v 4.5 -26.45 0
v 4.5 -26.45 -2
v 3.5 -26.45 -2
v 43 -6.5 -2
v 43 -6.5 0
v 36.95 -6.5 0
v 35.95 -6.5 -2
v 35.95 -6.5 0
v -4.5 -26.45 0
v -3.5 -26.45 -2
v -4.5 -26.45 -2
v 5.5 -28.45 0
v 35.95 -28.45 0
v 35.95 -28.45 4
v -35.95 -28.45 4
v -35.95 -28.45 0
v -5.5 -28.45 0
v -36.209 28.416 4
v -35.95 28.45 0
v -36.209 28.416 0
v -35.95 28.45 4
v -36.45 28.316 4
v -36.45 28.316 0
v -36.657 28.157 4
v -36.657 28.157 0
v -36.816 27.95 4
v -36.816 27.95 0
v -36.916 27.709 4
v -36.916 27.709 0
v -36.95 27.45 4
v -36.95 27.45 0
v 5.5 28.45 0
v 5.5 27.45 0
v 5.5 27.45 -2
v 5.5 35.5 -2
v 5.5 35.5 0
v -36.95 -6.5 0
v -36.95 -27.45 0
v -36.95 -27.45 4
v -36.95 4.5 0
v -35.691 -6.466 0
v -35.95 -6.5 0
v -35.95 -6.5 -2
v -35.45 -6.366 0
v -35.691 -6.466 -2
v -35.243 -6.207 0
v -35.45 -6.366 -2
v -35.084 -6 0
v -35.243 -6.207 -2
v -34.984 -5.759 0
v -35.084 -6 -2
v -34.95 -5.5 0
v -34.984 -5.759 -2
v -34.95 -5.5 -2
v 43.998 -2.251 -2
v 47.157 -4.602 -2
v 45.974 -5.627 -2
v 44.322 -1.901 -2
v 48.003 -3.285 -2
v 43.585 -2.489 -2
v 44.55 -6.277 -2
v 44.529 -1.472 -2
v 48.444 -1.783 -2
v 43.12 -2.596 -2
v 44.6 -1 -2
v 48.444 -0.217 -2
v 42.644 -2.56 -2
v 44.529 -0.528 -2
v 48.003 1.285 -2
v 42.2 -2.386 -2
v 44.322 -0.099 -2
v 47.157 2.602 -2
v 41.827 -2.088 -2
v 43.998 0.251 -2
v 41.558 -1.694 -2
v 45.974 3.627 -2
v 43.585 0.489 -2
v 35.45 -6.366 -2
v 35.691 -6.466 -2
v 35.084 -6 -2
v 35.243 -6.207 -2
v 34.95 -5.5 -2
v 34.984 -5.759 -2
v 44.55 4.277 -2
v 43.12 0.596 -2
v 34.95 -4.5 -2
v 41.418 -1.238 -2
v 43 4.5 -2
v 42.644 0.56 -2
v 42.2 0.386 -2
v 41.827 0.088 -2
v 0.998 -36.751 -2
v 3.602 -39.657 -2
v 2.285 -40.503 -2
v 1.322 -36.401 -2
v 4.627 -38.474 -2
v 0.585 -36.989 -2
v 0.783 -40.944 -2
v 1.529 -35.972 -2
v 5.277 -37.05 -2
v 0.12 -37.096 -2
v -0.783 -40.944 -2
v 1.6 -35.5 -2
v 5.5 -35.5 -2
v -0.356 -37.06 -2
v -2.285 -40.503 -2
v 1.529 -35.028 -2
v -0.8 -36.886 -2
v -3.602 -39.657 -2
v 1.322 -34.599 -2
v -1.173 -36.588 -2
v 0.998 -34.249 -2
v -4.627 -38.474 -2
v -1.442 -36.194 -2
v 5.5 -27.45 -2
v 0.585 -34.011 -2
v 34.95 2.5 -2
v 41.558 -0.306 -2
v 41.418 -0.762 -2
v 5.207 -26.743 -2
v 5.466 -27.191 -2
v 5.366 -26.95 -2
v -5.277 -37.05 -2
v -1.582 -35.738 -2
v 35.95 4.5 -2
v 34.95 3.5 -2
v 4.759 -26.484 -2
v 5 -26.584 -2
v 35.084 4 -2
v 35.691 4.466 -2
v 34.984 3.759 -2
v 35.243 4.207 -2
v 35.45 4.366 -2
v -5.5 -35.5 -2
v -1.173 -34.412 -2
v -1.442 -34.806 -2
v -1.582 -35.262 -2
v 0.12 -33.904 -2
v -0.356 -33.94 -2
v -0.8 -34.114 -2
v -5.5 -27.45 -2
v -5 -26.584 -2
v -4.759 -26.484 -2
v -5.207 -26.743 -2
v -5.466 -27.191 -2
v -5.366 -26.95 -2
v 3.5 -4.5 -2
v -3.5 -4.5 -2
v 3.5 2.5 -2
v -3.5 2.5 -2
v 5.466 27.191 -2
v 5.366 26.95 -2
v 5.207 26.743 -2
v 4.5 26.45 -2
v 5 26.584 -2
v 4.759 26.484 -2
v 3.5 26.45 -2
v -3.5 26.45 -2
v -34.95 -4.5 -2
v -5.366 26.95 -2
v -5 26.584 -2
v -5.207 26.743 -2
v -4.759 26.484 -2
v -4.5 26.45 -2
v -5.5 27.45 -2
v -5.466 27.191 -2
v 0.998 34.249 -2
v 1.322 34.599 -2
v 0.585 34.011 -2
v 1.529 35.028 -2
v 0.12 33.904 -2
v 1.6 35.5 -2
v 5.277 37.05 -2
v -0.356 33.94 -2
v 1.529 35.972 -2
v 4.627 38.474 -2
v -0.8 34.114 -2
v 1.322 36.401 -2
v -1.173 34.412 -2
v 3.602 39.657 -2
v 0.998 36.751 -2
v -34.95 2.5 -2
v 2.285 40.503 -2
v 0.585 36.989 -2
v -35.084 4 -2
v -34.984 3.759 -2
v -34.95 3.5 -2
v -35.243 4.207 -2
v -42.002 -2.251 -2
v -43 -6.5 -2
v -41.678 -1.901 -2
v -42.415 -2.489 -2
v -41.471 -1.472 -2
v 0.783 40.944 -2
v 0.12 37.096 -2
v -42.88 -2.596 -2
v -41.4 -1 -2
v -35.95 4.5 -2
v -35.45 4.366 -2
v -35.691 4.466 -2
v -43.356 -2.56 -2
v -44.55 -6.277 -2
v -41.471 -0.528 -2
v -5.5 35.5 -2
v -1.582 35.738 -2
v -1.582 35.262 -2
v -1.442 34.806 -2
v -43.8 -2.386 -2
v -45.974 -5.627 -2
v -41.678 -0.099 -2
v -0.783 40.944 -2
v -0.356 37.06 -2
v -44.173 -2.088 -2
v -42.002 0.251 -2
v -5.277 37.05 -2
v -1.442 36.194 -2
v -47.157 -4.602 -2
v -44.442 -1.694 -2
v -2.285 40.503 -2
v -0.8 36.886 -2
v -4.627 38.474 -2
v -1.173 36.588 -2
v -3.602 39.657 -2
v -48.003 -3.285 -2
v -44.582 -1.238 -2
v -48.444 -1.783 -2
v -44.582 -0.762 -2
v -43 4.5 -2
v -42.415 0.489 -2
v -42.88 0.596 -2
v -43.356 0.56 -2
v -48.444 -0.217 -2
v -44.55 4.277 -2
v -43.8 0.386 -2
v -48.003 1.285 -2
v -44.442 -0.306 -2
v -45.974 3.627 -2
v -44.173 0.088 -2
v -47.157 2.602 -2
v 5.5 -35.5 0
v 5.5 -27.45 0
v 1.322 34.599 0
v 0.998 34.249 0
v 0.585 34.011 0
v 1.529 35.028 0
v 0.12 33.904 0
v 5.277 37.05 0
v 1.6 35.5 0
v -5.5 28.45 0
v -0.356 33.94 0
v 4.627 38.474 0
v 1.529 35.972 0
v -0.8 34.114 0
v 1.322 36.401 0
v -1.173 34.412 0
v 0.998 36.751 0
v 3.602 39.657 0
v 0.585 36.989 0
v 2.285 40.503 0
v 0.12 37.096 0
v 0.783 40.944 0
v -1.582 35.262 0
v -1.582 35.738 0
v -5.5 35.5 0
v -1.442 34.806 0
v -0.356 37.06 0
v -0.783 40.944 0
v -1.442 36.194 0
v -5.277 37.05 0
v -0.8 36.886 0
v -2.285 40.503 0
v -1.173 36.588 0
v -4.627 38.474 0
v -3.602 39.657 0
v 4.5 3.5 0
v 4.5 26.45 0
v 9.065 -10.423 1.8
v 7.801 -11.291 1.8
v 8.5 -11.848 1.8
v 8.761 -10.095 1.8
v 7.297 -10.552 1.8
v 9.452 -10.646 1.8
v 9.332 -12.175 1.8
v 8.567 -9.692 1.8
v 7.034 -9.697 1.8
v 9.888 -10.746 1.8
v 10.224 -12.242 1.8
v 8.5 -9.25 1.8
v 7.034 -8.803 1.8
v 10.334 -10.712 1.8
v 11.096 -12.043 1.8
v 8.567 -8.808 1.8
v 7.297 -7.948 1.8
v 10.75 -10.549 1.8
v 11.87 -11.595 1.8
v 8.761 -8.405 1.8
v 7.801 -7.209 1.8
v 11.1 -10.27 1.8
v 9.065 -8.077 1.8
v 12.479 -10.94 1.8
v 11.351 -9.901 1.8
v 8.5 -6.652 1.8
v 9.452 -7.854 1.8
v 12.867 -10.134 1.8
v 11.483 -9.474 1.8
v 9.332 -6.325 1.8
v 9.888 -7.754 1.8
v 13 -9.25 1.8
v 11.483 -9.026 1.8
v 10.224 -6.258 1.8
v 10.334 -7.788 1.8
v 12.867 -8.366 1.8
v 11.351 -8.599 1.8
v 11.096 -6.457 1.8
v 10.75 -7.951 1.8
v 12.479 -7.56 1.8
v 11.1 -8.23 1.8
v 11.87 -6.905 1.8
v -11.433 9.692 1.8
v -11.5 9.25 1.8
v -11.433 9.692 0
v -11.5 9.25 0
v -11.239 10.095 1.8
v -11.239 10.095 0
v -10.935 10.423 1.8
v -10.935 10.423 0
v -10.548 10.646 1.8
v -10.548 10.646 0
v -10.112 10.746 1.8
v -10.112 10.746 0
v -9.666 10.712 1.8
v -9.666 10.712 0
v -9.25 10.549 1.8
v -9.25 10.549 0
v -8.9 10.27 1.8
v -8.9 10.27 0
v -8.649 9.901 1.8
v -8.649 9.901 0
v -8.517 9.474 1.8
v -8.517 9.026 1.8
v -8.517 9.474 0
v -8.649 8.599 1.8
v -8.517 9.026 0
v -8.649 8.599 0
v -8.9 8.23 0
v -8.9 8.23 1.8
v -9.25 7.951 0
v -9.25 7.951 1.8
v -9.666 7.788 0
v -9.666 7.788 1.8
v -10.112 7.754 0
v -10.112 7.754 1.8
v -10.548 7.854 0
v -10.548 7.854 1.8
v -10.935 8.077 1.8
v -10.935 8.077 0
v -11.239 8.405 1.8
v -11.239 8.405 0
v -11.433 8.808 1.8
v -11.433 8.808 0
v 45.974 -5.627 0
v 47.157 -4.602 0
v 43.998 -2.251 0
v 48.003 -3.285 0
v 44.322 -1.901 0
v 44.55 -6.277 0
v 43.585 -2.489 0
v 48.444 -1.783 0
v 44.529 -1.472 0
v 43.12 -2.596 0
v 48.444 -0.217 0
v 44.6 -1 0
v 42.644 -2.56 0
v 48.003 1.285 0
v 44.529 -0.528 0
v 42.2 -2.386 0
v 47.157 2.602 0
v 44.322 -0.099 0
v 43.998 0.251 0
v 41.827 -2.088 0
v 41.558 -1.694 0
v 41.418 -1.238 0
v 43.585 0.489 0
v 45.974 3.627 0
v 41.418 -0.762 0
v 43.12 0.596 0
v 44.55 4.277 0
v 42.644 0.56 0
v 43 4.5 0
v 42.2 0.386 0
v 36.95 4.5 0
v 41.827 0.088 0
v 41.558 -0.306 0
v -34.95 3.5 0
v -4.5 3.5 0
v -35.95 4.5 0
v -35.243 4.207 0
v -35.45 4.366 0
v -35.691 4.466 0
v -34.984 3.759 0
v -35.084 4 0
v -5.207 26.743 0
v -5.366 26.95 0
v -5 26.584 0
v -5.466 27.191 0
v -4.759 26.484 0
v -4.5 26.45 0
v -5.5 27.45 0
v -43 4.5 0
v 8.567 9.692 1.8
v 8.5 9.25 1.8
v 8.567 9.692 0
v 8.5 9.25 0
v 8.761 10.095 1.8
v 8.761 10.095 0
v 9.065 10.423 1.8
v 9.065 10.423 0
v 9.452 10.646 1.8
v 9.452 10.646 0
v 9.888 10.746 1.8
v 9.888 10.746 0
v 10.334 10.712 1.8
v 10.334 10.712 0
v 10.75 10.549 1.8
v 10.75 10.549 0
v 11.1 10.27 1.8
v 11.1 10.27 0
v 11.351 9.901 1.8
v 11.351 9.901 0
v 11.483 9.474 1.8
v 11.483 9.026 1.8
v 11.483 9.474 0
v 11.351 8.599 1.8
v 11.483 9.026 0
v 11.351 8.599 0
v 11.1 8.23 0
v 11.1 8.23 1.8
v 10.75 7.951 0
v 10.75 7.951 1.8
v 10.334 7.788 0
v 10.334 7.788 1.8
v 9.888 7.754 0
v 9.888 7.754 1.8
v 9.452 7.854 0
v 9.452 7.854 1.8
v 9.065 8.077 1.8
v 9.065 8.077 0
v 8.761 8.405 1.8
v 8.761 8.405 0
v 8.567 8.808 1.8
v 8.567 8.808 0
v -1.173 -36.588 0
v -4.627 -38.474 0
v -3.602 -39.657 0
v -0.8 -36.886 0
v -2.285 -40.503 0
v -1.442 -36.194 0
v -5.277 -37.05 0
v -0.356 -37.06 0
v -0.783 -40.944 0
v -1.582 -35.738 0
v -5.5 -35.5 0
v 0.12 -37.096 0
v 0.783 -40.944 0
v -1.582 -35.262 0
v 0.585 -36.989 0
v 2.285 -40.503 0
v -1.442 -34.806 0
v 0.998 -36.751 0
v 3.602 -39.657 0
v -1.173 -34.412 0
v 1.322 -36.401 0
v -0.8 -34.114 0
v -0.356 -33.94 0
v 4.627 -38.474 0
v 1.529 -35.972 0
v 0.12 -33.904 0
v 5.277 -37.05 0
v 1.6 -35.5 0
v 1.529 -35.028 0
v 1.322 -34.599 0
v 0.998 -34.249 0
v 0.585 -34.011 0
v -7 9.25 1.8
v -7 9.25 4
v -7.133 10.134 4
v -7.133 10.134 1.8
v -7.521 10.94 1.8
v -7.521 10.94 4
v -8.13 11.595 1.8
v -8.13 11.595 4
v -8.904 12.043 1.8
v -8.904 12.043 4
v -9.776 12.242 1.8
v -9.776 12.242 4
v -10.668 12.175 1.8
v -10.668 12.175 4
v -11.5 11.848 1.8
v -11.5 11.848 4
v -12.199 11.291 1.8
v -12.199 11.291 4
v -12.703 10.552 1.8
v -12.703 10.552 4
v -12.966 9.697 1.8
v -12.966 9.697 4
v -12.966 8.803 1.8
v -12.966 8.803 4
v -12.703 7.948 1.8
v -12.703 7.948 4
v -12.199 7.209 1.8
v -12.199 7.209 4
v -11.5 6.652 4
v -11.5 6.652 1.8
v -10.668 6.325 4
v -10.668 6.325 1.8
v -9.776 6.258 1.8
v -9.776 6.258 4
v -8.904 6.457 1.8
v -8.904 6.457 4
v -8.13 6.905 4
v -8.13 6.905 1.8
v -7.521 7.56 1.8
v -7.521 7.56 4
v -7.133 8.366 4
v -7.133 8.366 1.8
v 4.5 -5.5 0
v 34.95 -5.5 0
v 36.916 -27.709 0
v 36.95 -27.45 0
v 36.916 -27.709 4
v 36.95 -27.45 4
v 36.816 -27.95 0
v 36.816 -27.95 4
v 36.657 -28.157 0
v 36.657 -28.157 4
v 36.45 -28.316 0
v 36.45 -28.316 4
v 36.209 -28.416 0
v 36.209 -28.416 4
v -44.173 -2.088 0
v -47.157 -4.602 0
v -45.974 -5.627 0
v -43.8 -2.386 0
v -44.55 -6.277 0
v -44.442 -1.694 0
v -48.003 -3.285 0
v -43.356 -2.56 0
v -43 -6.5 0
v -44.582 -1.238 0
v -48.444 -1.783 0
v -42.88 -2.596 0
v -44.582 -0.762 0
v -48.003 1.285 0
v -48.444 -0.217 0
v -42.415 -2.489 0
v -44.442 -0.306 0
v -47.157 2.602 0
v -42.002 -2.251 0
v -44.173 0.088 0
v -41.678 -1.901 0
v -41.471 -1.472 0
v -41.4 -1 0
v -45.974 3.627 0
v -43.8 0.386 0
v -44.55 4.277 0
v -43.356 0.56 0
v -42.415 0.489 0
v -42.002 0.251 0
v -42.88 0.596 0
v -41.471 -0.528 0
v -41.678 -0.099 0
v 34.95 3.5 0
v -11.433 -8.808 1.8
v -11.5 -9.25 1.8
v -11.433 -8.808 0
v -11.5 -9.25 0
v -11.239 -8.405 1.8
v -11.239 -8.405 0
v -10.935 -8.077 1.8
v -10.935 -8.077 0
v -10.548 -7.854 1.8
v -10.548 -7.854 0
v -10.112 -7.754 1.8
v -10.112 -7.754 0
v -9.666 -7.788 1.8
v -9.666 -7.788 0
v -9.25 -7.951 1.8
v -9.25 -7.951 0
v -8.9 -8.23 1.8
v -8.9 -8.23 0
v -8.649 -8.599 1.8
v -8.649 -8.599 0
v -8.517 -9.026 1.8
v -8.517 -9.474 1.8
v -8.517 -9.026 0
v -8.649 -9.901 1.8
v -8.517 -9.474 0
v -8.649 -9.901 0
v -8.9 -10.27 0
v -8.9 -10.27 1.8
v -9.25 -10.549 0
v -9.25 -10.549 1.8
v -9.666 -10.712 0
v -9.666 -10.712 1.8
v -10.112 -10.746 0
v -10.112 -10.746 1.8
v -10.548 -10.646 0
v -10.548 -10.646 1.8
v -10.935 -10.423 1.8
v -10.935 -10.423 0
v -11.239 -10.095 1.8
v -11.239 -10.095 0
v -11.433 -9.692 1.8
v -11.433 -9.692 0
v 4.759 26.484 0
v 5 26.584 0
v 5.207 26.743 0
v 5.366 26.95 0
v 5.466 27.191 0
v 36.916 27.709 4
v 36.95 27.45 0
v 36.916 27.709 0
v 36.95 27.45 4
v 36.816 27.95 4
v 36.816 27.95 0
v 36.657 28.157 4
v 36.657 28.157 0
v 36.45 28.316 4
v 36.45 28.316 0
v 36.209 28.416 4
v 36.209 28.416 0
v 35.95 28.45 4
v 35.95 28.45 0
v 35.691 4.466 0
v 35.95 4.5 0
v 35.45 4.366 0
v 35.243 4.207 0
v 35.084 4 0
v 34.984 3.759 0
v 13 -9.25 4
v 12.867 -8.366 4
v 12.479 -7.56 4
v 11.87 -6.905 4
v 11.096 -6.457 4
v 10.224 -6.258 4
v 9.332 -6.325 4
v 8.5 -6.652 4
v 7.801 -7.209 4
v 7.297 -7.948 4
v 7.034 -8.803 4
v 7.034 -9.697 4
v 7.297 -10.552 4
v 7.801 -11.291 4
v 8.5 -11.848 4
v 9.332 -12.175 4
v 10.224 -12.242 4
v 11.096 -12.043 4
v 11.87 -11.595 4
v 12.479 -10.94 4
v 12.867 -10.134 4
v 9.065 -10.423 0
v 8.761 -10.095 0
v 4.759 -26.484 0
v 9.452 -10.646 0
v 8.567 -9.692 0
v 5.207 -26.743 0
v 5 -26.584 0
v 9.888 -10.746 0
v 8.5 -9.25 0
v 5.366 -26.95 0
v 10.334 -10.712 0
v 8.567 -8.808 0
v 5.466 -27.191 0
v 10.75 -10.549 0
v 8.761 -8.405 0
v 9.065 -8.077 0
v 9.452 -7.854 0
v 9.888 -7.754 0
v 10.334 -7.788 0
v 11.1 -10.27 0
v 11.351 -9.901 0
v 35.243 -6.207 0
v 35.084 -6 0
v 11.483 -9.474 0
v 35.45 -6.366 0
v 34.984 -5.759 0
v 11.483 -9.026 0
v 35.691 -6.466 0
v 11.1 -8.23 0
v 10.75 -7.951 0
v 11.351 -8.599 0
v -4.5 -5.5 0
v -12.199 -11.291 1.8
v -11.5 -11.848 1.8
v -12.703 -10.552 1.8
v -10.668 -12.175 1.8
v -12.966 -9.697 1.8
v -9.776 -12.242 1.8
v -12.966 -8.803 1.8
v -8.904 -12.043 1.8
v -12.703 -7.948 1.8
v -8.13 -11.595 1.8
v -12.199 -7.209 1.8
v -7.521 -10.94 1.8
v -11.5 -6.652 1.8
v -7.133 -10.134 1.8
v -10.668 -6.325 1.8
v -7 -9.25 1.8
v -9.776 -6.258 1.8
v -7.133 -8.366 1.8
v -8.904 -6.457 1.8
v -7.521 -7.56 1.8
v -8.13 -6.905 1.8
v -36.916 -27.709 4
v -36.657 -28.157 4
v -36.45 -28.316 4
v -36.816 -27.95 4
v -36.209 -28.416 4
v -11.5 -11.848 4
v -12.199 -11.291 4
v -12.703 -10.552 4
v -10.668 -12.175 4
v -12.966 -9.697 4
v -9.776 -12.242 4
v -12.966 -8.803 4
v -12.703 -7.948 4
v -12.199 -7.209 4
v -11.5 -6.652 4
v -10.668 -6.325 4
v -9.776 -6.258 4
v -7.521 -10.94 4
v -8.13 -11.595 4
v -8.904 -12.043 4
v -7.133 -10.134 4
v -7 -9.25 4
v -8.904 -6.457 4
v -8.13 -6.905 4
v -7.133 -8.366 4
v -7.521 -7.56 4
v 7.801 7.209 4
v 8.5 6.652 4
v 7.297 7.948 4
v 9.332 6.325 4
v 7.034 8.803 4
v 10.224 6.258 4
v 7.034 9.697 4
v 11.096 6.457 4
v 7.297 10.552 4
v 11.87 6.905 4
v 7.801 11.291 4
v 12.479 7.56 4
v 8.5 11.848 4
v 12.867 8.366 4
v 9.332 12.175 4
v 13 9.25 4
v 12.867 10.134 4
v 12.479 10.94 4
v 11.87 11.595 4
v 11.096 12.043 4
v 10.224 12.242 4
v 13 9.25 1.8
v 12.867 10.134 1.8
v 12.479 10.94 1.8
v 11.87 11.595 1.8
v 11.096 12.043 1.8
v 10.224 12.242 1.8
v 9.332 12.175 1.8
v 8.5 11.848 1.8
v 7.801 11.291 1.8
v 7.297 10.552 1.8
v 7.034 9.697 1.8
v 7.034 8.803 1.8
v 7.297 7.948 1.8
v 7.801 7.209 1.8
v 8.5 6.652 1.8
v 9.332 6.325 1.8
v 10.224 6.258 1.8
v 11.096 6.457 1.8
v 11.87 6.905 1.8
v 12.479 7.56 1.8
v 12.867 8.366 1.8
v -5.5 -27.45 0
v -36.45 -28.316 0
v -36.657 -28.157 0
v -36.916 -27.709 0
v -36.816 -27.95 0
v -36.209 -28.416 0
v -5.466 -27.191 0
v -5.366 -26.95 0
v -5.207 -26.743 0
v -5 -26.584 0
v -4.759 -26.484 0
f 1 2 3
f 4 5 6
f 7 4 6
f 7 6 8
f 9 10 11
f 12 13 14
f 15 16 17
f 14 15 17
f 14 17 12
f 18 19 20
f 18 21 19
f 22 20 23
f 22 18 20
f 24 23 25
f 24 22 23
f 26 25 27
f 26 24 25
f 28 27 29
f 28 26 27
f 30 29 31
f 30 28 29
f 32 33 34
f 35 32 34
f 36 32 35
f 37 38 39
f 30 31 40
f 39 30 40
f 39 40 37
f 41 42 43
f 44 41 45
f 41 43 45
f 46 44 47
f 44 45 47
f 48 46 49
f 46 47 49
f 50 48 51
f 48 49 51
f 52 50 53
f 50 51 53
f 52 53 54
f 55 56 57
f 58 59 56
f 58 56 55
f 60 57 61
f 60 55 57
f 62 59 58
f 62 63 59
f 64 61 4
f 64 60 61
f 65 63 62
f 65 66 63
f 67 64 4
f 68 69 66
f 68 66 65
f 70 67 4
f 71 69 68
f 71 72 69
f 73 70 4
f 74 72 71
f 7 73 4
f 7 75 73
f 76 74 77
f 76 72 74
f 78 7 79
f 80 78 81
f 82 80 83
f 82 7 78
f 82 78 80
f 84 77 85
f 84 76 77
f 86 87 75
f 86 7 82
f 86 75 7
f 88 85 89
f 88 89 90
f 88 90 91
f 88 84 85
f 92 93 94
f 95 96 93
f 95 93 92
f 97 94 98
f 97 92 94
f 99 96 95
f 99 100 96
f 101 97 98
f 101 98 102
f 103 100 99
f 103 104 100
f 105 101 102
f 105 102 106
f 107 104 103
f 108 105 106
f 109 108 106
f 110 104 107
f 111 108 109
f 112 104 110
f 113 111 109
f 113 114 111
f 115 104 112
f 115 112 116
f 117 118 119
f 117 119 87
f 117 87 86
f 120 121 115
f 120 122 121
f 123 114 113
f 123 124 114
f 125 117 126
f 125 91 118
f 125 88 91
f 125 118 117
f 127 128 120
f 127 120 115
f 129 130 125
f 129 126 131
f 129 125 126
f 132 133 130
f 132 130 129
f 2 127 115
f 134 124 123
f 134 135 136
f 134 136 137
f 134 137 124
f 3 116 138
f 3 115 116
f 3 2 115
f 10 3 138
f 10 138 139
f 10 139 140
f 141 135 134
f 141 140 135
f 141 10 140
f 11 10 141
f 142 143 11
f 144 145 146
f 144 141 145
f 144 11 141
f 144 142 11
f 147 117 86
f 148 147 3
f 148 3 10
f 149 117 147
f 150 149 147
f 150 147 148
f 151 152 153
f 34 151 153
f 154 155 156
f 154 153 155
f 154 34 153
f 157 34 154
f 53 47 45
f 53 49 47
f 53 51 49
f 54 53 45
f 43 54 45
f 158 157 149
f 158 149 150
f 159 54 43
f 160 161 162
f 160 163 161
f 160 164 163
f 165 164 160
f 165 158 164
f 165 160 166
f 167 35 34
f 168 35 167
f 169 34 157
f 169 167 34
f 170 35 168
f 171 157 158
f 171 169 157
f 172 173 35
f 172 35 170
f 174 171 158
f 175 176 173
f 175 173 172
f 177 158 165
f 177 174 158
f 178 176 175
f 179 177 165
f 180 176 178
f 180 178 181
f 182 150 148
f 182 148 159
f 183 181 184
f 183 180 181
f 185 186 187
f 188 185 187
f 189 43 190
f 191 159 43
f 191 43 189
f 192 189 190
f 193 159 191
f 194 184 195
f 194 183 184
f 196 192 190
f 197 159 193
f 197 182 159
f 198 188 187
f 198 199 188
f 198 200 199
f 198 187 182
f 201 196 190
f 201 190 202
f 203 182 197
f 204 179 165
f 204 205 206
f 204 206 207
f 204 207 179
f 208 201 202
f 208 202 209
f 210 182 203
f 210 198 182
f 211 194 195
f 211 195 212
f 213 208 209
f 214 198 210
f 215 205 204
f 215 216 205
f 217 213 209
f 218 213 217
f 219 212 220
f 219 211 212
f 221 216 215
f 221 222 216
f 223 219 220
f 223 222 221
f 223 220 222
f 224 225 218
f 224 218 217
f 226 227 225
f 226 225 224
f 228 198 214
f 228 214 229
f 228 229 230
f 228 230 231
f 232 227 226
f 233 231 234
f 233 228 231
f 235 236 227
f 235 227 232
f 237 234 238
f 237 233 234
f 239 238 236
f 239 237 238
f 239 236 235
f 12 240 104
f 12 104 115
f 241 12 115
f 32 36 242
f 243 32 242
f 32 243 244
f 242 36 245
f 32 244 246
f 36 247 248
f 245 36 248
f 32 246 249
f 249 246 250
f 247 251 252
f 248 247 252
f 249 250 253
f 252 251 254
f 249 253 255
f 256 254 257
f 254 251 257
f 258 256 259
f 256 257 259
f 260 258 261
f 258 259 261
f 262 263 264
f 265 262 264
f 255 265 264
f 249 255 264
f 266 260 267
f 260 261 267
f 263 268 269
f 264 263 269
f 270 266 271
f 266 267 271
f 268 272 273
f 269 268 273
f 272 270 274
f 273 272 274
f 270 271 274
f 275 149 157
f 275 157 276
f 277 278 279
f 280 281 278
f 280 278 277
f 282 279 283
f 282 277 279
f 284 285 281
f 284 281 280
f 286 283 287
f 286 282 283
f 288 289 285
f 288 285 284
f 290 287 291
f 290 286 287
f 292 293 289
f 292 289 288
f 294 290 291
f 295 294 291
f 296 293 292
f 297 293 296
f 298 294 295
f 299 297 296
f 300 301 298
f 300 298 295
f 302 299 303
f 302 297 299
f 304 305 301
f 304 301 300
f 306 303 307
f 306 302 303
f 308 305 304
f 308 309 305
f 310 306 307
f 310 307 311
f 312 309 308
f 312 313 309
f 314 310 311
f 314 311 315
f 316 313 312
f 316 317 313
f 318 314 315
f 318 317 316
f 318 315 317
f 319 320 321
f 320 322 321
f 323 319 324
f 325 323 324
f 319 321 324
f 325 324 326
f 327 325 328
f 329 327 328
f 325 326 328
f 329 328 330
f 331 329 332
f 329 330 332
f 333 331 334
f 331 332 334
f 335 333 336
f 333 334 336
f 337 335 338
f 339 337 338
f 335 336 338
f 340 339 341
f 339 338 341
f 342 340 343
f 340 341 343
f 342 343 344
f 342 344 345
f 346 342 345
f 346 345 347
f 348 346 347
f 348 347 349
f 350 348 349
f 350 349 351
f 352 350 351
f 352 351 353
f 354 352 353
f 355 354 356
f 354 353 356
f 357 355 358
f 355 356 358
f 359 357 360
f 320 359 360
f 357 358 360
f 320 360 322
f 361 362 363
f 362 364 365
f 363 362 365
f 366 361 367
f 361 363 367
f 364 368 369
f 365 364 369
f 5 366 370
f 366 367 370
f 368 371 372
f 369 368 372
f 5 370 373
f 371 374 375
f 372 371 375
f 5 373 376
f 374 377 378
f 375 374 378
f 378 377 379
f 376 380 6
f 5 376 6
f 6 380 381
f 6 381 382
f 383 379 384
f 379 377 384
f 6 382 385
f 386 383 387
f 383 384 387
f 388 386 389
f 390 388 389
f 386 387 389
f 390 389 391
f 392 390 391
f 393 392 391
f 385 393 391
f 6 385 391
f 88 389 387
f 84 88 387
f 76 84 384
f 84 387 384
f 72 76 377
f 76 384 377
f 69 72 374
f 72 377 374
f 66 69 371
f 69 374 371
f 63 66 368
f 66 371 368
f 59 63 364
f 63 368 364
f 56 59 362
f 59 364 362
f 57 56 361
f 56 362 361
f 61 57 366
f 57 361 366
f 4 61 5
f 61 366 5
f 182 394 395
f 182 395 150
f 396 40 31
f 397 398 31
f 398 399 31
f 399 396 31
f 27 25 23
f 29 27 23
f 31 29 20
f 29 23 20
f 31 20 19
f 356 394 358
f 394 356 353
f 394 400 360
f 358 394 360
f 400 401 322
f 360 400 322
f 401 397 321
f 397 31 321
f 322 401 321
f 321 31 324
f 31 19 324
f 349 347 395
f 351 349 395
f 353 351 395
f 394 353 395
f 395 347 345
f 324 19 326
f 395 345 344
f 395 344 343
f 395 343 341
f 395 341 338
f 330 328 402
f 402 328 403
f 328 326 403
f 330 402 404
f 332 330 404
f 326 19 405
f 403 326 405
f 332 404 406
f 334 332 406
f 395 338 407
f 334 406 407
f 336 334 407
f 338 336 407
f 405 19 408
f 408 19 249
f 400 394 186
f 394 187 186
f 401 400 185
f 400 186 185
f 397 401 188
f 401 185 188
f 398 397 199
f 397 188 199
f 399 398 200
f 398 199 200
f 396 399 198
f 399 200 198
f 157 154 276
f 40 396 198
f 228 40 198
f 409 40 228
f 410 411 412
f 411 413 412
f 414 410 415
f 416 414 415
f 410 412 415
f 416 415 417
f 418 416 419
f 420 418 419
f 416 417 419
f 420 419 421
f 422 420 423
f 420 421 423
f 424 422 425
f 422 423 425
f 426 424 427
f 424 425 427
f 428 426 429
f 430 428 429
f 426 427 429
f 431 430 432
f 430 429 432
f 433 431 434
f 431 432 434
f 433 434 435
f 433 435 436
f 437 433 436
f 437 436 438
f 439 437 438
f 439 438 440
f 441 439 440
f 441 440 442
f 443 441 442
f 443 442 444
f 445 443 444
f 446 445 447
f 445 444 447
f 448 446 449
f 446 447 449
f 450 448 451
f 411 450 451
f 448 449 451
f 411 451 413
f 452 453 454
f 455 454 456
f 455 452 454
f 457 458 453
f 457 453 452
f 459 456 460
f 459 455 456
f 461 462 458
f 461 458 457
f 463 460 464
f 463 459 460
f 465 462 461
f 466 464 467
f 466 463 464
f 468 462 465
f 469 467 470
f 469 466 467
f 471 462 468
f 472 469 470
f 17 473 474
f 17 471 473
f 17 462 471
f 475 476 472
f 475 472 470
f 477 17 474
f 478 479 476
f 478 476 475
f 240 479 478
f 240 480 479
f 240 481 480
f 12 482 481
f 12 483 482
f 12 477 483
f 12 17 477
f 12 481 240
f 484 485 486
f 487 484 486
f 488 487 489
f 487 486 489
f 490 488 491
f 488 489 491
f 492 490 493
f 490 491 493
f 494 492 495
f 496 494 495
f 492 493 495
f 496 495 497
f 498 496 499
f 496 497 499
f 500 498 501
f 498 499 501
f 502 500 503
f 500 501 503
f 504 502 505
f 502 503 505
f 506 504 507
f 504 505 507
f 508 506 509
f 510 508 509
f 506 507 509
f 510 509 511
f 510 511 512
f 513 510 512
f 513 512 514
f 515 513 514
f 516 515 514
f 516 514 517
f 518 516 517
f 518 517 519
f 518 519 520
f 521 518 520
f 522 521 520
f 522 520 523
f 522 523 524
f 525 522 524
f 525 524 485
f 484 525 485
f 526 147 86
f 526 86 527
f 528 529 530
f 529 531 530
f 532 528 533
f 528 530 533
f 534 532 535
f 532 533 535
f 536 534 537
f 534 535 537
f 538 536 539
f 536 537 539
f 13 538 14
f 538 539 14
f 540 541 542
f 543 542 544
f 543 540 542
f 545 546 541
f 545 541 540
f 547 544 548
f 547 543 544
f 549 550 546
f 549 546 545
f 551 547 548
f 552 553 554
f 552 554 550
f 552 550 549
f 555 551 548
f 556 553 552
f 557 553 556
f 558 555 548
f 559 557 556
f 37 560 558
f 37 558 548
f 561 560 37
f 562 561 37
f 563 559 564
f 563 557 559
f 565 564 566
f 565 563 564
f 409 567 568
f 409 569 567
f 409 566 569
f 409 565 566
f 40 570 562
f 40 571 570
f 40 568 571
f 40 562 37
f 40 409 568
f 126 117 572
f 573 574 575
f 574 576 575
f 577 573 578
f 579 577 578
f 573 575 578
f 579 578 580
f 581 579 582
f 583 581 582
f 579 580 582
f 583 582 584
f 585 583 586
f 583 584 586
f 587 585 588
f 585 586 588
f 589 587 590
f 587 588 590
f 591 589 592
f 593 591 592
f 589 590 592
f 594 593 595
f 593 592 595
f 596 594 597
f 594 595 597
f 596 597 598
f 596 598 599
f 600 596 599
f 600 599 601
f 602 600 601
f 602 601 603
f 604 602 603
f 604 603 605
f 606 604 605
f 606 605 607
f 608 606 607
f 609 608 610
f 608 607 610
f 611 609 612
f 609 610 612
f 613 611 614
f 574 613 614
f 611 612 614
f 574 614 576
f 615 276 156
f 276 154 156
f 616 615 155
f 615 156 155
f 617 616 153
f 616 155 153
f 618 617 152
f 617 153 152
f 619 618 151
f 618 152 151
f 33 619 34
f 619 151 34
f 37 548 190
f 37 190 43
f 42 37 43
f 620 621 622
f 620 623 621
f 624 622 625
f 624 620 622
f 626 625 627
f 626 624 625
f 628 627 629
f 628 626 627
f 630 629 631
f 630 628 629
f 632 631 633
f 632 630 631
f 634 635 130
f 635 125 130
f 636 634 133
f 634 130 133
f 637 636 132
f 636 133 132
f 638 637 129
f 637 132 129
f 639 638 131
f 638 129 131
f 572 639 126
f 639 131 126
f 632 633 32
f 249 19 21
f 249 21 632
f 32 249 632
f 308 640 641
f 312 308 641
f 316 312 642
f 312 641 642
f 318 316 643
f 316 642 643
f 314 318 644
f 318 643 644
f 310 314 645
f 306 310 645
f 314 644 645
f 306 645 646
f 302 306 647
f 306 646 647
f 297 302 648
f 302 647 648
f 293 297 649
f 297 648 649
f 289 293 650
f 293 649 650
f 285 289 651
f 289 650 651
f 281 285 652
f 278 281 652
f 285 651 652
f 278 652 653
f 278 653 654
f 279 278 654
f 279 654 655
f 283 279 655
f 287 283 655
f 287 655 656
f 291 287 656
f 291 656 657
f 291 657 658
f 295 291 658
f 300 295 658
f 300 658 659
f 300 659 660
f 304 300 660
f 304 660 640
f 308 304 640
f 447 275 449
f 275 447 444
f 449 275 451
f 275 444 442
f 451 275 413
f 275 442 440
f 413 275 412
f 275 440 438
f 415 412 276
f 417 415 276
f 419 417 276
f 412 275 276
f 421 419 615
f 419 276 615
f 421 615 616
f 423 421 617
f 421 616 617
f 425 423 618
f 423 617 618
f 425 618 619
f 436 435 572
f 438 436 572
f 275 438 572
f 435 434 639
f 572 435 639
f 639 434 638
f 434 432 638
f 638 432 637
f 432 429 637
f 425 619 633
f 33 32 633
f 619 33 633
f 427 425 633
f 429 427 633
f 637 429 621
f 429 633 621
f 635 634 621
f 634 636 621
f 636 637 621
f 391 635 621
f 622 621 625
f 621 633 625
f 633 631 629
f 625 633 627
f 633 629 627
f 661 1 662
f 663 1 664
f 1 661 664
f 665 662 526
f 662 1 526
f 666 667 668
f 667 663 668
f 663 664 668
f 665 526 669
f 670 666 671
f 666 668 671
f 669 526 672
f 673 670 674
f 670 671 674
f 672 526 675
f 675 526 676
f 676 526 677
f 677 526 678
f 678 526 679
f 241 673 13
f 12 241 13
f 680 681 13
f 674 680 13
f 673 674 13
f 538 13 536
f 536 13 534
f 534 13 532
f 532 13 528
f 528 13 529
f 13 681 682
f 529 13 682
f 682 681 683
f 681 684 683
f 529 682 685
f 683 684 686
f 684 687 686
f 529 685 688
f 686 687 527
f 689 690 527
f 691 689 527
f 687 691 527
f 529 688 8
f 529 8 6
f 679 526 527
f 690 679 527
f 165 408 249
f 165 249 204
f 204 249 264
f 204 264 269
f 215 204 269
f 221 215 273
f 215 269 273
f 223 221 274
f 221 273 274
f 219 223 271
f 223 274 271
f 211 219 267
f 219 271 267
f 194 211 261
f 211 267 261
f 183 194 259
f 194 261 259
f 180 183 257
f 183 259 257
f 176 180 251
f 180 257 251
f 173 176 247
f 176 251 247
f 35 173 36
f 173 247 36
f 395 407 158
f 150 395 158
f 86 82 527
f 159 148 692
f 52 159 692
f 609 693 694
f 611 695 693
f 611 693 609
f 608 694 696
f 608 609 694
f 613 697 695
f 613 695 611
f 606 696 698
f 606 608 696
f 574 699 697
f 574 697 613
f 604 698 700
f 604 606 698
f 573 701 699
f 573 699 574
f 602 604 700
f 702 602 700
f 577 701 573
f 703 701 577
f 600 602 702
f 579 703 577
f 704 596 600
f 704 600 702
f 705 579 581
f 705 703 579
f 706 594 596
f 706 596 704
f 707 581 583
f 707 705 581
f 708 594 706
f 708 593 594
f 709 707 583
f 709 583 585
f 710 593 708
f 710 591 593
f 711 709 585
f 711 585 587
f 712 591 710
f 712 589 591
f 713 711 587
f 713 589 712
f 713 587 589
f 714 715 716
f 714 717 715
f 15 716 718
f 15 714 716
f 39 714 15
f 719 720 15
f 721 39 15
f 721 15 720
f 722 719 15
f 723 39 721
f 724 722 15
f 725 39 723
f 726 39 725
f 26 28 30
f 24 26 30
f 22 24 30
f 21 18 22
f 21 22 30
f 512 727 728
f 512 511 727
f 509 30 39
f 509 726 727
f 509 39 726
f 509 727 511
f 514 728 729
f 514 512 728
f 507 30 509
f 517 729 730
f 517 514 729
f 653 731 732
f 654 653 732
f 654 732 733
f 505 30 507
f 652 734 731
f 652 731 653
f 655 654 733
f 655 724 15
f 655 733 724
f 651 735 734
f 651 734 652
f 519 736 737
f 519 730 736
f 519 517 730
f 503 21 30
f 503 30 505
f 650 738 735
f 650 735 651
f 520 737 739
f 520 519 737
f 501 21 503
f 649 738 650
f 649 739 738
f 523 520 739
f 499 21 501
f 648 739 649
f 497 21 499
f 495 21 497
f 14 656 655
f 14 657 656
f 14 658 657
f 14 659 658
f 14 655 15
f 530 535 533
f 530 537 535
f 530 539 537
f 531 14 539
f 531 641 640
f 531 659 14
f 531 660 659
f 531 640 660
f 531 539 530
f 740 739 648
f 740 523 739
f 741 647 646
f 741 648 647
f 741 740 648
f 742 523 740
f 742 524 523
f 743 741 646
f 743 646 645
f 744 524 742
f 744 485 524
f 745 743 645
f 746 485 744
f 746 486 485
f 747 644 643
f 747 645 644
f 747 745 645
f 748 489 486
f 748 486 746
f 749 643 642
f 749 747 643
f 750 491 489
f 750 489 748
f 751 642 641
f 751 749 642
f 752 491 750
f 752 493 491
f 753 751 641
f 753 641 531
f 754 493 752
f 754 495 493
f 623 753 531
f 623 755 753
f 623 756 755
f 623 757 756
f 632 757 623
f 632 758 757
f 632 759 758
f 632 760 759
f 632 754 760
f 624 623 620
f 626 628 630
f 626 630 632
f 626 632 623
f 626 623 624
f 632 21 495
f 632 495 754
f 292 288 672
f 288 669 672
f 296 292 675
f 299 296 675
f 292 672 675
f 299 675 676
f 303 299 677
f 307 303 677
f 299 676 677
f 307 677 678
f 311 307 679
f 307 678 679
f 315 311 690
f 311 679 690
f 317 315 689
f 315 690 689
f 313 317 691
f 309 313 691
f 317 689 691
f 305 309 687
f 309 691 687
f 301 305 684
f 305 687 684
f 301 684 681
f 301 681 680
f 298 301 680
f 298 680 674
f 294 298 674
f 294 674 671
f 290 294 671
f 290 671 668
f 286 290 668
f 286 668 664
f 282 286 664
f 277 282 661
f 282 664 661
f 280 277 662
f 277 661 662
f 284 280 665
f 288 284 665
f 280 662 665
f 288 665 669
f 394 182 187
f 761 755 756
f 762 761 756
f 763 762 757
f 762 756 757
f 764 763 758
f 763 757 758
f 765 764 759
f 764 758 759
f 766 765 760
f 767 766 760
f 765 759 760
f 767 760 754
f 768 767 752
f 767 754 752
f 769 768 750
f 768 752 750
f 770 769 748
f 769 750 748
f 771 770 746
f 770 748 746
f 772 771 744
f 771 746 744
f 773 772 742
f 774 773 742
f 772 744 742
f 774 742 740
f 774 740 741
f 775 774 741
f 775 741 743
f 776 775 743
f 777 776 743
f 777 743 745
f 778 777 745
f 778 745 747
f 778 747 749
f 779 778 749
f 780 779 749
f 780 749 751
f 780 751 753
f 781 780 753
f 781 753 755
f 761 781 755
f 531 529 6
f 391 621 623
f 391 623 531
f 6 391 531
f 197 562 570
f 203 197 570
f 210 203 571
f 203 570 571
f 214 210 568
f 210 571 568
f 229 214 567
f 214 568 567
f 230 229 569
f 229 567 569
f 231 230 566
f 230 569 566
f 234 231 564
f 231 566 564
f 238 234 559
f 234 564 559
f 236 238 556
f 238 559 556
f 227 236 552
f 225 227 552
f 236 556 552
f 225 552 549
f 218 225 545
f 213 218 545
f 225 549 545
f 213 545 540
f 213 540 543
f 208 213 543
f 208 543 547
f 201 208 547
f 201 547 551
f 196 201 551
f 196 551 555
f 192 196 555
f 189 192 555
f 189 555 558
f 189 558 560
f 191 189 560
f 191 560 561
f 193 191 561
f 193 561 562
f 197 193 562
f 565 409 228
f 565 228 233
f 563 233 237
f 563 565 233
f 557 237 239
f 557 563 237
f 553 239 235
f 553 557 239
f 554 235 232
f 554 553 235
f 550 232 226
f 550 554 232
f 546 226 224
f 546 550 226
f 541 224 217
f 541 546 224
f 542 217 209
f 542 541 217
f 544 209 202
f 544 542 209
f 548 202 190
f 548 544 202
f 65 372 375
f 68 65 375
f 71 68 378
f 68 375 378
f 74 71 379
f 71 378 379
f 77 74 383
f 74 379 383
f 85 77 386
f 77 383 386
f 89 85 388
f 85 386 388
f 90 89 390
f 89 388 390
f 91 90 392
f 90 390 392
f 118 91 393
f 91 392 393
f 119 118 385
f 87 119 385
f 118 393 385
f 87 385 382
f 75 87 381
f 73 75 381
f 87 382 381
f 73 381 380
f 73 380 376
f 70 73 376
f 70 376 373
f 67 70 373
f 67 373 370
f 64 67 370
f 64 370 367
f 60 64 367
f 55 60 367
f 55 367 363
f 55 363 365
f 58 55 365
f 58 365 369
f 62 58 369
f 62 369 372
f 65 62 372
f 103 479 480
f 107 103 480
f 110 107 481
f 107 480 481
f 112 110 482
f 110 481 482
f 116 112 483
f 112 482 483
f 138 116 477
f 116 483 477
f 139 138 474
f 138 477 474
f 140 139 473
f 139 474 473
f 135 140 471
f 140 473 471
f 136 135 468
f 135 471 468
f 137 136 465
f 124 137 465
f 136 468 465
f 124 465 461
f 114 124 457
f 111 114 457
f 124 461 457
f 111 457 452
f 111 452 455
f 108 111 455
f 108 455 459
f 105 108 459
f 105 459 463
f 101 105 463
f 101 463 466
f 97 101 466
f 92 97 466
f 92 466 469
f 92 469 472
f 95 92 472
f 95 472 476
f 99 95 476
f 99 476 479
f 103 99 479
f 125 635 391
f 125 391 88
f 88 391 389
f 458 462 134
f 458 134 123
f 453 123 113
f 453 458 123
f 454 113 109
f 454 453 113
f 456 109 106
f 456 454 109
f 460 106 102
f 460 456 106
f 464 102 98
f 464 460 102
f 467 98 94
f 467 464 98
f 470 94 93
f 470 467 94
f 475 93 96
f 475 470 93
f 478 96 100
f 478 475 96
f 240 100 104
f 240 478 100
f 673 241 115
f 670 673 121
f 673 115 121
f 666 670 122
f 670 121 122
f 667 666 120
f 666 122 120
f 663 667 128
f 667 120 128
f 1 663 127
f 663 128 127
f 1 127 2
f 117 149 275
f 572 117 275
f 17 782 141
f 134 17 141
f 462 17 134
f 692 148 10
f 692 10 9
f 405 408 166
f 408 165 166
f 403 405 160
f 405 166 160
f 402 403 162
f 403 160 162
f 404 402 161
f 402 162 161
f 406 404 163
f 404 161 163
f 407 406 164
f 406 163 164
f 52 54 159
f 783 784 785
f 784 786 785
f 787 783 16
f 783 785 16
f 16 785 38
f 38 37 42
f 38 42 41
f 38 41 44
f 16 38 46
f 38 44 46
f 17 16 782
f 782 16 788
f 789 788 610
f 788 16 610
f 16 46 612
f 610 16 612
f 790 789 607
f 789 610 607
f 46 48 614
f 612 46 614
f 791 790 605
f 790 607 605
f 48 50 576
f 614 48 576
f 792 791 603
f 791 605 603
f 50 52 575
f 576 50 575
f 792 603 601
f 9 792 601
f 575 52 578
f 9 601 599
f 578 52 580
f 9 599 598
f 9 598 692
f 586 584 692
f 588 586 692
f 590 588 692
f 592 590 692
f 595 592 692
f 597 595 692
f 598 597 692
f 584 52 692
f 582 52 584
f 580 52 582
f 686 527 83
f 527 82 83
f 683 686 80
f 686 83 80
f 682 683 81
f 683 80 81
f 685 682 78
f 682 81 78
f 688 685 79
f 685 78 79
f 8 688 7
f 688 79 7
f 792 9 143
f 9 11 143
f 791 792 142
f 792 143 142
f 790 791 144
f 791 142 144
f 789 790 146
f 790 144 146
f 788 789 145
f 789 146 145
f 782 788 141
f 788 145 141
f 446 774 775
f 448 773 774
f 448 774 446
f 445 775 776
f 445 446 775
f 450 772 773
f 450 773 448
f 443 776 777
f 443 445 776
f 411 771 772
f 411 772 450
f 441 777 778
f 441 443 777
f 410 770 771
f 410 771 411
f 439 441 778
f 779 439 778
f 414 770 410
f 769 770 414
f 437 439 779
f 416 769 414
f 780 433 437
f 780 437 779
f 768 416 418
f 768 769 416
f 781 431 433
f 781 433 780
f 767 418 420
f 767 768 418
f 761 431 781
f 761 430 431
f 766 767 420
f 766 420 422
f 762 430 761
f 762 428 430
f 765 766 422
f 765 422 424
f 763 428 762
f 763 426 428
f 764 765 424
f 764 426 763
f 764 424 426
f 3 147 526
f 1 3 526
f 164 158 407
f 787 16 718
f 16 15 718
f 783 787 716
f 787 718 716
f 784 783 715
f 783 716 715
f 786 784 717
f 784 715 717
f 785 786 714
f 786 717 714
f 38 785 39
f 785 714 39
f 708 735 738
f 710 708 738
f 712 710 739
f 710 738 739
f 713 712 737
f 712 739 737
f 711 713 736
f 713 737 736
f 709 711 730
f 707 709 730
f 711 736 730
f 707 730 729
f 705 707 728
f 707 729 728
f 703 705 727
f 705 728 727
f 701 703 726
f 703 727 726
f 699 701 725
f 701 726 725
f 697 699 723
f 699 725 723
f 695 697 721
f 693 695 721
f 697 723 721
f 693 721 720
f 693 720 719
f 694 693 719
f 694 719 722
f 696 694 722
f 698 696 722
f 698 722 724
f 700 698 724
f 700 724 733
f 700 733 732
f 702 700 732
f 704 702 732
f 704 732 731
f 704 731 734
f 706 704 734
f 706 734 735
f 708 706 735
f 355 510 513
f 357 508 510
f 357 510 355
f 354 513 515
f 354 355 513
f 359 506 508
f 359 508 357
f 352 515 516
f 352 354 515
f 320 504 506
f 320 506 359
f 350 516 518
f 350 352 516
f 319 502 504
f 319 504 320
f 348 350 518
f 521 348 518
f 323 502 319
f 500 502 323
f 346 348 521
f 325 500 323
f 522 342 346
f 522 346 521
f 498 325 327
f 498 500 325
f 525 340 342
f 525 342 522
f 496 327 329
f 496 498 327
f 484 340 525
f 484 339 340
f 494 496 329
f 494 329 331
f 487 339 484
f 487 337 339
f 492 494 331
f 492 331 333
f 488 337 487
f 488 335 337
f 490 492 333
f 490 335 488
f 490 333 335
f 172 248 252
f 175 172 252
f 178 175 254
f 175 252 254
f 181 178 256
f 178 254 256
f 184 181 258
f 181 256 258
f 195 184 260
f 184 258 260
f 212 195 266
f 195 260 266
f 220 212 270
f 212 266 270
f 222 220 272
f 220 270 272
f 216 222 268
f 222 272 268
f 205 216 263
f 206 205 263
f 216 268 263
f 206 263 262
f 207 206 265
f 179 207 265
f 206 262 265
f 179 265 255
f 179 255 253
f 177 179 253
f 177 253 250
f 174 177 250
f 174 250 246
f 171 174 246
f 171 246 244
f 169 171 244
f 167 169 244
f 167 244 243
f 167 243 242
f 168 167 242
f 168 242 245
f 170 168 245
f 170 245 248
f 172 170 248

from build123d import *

# Parameters (mm, degrees)
SKETCH_1_W                = 73.9
SKETCH_1_H                = 56.9
EXTRUDE_1_DEPTH           = 4
HOLE_WIZARD_1_D           = 3
HOLE_WIZARD_1_CBORE_D     = 6
HOLE_WIZARD_1_CBORE_DEPTH = 2.2
SKETCH_4_W                = 7
SKETCH_4_H                = 25.95
SKETCH_4_W_2              = 33.45
SKETCH_4_H_2              = 7
SKETCH_4_H_3              = 23.95
EXTRUDE_2_DEPTH           = 2
HOLE_WIZARD_2_D           = 3.2
CHAMFER_1_SIZE            = 1
CHAMFER_1_SIZE_2          = 2
CHAMFER_2_SIZE            = 2
CHAMFER_2_SIZE_2          = 1
CHAMFER_3_SIZE            = 2
CHAMFER_3_SIZE_2          = 1
SKETCH_7_W                = 2
SKETCH_7_H                = 1
SKETCH_7_W_2              = 1
SKETCH_7_H_2              = 2
EXTRUDE_3_DEPTH           = 2
FILLET_3_R                = 1
FILLET_4_R                = 1


with BuildPart() as part:
    # 草图1 → 凸台-拉伸1 (new body)
    with BuildSketch(Plane.XY):
        Rectangle(SKETCH_1_W, SKETCH_1_H)
    extrude(amount=EXTRUDE_1_DEPTH)

    # 孔1 (through all)
    with Locations(Plane(origin=(-10, 9.25, 4), x_dir=(1, 0, 0), z_dir=(0, 0, 1))):
        with Locations((0, 0), (20, 0), (20, -18.5), (0, -18.5)):
            CounterBoreHole(HOLE_WIZARD_1_D / 2, HOLE_WIZARD_1_CBORE_D / 2, HOLE_WIZARD_1_CBORE_DEPTH)

    # 草图4 → 凸台-拉伸2 (add)
    with BuildSketch(Plane(origin=(0, 0, 0), x_dir=(-1, 0, 0), z_dir=(0, 0, -1))):
        with BuildLine():
            Line((3.5, 28.45), (3.5, 35.5))
            ThreePointArc((3.5, 35.5), (0, 39), (-3.5, 35.5))
            Line((-3.5, 35.5), (-3.5, 28.45))
            Line((-3.5, 28.45), (3.5, 28.45))
        make_face()
        with Locations((0, 15.475)):
            Rectangle(SKETCH_4_W, SKETCH_4_H)
        with Locations((20.225, -1)):
            Rectangle(SKETCH_4_W_2, SKETCH_4_H_2)
        with BuildLine():
            Line((43, 2.5), (36.95, 2.5))
            Line((36.95, 2.5), (36.95, -4.5))
            Line((36.95, -4.5), (43, -4.5))
            ThreePointArc((43, -4.5), (46.5, -1), (43, 2.5))
        make_face()
        with Locations((0, -1)):
            Rectangle(SKETCH_4_W, SKETCH_4_H_2)
        with Locations((-20.225, -1)):
            Rectangle(SKETCH_4_W_2, SKETCH_4_H_2)
        with Locations((0, -16.475)):
            Rectangle(SKETCH_4_W, SKETCH_4_H_3)
        with BuildLine():
            Line((-36.95, -4.5), (-36.95, 2.5))
            Line((-36.95, 2.5), (-43, 2.5))
            ThreePointArc((-43, 2.5), (-46.5, -1), (-43, -4.5))
            Line((-43, -4.5), (-36.95, -4.5))
        make_face()
        with BuildLine():
            Line((3.5, -35.5), (3.5, -28.45))
            Line((3.5, -28.45), (-3.5, -28.45))
            Line((-3.5, -28.45), (-3.5, -35.5))
            ThreePointArc((-3.5, -35.5), (0, -39), (3.5, -35.5))
        make_face()
    extrude(amount=EXTRUDE_2_DEPTH)

    # 孔2 (through all)
    with Locations(Plane(origin=(43, -1, -2), x_dir=(-1, 0, 0), z_dir=(0, 0, -1))):
        with Locations((0, 0), (43, 36.5), (86, 0), (43, -34.5)):
            Hole(HOLE_WIZARD_2_D / 2)

    # 倒角1
    # the kernel refuses this chamfer: 2, 1 mm, written as the material it adds along each edge
    with BuildSketch(Plane(origin=(-3.5, -2.679657748, 0), x_dir=(-0.9976223042390326, 0, 0.06891834360170879), z_dir=(0, 1, 0))) as chamfer_1_piece_1:
        Polygon((CHAMFER_1_SIZE * 0.997622304239, -CHAMFER_1_SIZE * 0.0689183436017), (-CHAMFER_1_SIZE_2 * 0.0689183436017, -CHAMFER_1_SIZE_2 * 0.997622304239), (0, 0), align=None)
    extrude(amount=31.129657748)
    with BuildSketch(Plane(origin=(-36.95, 2.5, 0), x_dir=(0, 0.9976223042390326, 0.06891834360170879), z_dir=(1, 0, 0))) as chamfer_1_piece_2:
        Polygon((CHAMFER_1_SIZE * 0.997622304239, -CHAMFER_1_SIZE * 0.0689183436017), (-CHAMFER_1_SIZE_2 * 0.0689183436017, -CHAMFER_1_SIZE_2 * 0.997622304239), (0, 0), align=None)
    extrude(amount=38.629657748)

    # 倒角2
    # the kernel refuses this chamfer: 2, 1 mm, written as the material it adds along each edge
    with BuildSketch(Plane(origin=(-3.5, 0.679657748, 0), x_dir=(0.017268075123668084, 0, -0.9998508956747119), z_dir=(0, -1, 0))) as chamfer_2_piece_1:
        Polygon((CHAMFER_2_SIZE * 0.999850895675, -CHAMFER_2_SIZE * 0.0172680751237), (-CHAMFER_2_SIZE_2 * 0.0172680751237, -CHAMFER_2_SIZE_2 * 0.999850895675), (0, 0), align=None)
    extrude(amount=29.129657748)
    with BuildSketch(Plane(origin=(-36.95, -4.5, 0), x_dir=(0, 0.017268075123667872, -0.9998508956747119), z_dir=(1, 0, 0))) as chamfer_2_piece_2:
        Polygon((CHAMFER_2_SIZE * 0.999850895675, -CHAMFER_2_SIZE * 0.0172680751237), (-CHAMFER_2_SIZE_2 * 0.0172680751237, -CHAMFER_2_SIZE_2 * 0.999850895675), (0, 0), align=None)
    extrude(amount=38.629657748)

    # 倒角3
    # the kernel refuses this chamfer: 2, 1 mm, written as the material it adds along each edge
    with BuildSketch(Plane(origin=(3.5, -28.45, 0), x_dir=(-0.0172680751236683, 0, -0.9998508956747119), z_dir=(0, 1, 0))) as chamfer_3_piece_1:
        Polygon((CHAMFER_3_SIZE * 0.999850895675, -CHAMFER_3_SIZE * 0.0172680751237), (-CHAMFER_3_SIZE_2 * 0.0172680751237, -CHAMFER_3_SIZE_2 * 0.999850895675), (0, 0), align=None)
    extrude(amount=29.129657748)
    with BuildSketch(Plane(origin=(-1.679657748, -4.5, 0), x_dir=(0, 0.0172680751236683, -0.9998508956747119), z_dir=(1, 0, 0)), Plane(origin=(36.95, 2.5, 0), x_dir=(0, -0.017268075123667872, -0.9998508956747119), z_dir=(-1, 0, 0))) as chamfer_3_piece_2:
        Polygon((CHAMFER_3_SIZE * 0.999850895675, -CHAMFER_3_SIZE * 0.0172680751237), (-CHAMFER_3_SIZE_2 * 0.0172680751237, -CHAMFER_3_SIZE_2 * 0.999850895675), (0, 0), align=None)
    extrude(amount=38.629657748)
    with BuildSketch(Plane(origin=(3.5, -2.679657748, 0), x_dir=(-0.017268075123668084, 0, -0.9998508956747119), z_dir=(0, 1, 0))) as chamfer_3_piece_3:
        Polygon((CHAMFER_3_SIZE * 0.999850895675, -CHAMFER_3_SIZE * 0.0172680751237), (-CHAMFER_3_SIZE_2 * 0.0172680751237, -CHAMFER_3_SIZE_2 * 0.999850895675), (0, 0), align=None)
    extrude(amount=31.129657748)

    # 草图7 → 凸台-拉伸3 (add)
    # profile 1 of 6: a face of its own
    with BuildSketch(Plane(origin=(0, 0, 0), x_dir=(-1, 0, 0), z_dir=(0, 0, -1))):
        with BuildLine():
            Line((-36.95, 4.5), (-43, 4.5))
            ThreePointArc((-43, 4.5), (-48.5, -1), (-43, -6.5))
            Line((-43, -6.5), (-34.95, -6.5))
            Line((-34.95, -6.5), (-34.95, 3.5))
            Line((-34.95, 3.5), (-36.95, 3.5))
            Line((-36.95, 3.5), (-36.95, 4.5))
        make_face()
        with BuildLine():
            Line((-43, 2.5), (-36.95, 2.5))
            Line((-36.95, 2.5), (-36.95, -4.5))
            Line((-36.95, -4.5), (-43, -4.5))
            ThreePointArc((-43, -4.5), (-46.5, -1), (-43, 2.5))
        make_face(mode=Mode.SUBTRACT)
    # profile 2 of 6: a face of its own
    with BuildSketch(Plane(origin=(0, 0, 0), x_dir=(-1, 0, 0), z_dir=(0, 0, -1))):
        with Locations((-35.95, 4)):
            Rectangle(SKETCH_7_W, SKETCH_7_H)
    # profile 3 of 6: a face of its own
    with BuildSketch(Plane(origin=(0, 0, 0), x_dir=(-1, 0, 0), z_dir=(0, 0, -1))):
        with BuildLine():
            Line((-5.5, -35.5), (-5.5, -26.45))
            Line((-5.5, -26.45), (5.5, -26.45))
            Line((5.5, -26.45), (5.5, -35.5))
            ThreePointArc((5.5, -35.5), (0, -41), (-5.5, -35.5))
        make_face()
        with BuildLine():
            ThreePointArc((-3.5, -35.5), (0, -39), (3.5, -35.5))
            Line((3.5, -35.5), (3.5, -28.45))
            Line((3.5, -28.45), (-3.5, -28.45))
            Line((-3.5, -28.45), (-3.5, -35.5))
        make_face(mode=Mode.SUBTRACT)
    # profile 4 of 6: a face of its own
    with BuildSketch(Plane(origin=(0, 0, 0), x_dir=(-1, 0, 0), z_dir=(0, 0, -1))):
        with BuildLine():
            Line((43, -6.5), (34.95, -6.5))
            Line((34.95, -6.5), (34.95, 4.5))
            Line((34.95, 4.5), (43, 4.5))
            ThreePointArc((43, 4.5), (48.5, -1), (43, -6.5))
        make_face()
        with BuildLine():
            ThreePointArc((43, -4.5), (46.5, -1), (43, 2.5))
            Line((43, 2.5), (36.95, 2.5))
            Line((36.95, 2.5), (36.95, -4.5))
            Line((36.95, -4.5), (43, -4.5))
        make_face(mode=Mode.SUBTRACT)
    # profile 5 of 6: a face of its own
    with BuildSketch(Plane(origin=(0, 0, 0), x_dir=(-1, 0, 0), z_dir=(0, 0, -1))):
        with BuildLine():
            Line((-5.5, 35.5), (-5.5, 28.45))
            Line((-5.5, 28.45), (-4.5, 28.45))
            Line((-4.5, 28.45), (-4.5, 26.45))
            Line((-4.5, 26.45), (5.5, 26.45))
            Line((5.5, 26.45), (5.5, 35.5))
            ThreePointArc((5.5, 35.5), (0, 41), (-5.5, 35.5))
        make_face()
        with BuildLine():
            Line((3.5, 35.5), (3.5, 28.45))
            Line((3.5, 28.45), (-3.5, 28.45))
            Line((-3.5, 28.45), (-3.5, 35.5))
            ThreePointArc((-3.5, 35.5), (0, 39), (3.5, 35.5))
        make_face(mode=Mode.SUBTRACT)
    # profile 6 of 6: a face of its own
    with BuildSketch(Plane(origin=(0, 0, 0), x_dir=(-1, 0, 0), z_dir=(0, 0, -1))):
        with Locations((-5, 27.45)):
            Rectangle(SKETCH_7_W_2, SKETCH_7_H_2)
    extrude(amount=EXTRUDE_3_DEPTH)

    # 圆角3
    fillet_3_edges = [part.edges().sort_by_distance(p)[0] for p in [
        (-34.95, -6.5, -1),
        (-34.95, 4.5, -1),
        (5.5, -26.45, -1),
        (-5.5, -26.45, -1),
        (-5.5, 26.45, -1),
        (5.5, 26.45, -1),
        (34.95, 4.5, -1),
        (34.95, -6.5, -1),
    ]]
    fillet(fillet_3_edges, radius=FILLET_3_R)

    # 圆角4
    fillet_4_edges = [part.edges().sort_by_distance(p)[0] for p in [
        (36.95, -28.45, 2),
        (-36.95, -28.45, 2),
        (-36.95, 28.45, 2),
        (36.95, 28.45, 2),
    ]]
    fillet(fillet_4_edges, radius=FILLET_4_R)


solid = part.part
